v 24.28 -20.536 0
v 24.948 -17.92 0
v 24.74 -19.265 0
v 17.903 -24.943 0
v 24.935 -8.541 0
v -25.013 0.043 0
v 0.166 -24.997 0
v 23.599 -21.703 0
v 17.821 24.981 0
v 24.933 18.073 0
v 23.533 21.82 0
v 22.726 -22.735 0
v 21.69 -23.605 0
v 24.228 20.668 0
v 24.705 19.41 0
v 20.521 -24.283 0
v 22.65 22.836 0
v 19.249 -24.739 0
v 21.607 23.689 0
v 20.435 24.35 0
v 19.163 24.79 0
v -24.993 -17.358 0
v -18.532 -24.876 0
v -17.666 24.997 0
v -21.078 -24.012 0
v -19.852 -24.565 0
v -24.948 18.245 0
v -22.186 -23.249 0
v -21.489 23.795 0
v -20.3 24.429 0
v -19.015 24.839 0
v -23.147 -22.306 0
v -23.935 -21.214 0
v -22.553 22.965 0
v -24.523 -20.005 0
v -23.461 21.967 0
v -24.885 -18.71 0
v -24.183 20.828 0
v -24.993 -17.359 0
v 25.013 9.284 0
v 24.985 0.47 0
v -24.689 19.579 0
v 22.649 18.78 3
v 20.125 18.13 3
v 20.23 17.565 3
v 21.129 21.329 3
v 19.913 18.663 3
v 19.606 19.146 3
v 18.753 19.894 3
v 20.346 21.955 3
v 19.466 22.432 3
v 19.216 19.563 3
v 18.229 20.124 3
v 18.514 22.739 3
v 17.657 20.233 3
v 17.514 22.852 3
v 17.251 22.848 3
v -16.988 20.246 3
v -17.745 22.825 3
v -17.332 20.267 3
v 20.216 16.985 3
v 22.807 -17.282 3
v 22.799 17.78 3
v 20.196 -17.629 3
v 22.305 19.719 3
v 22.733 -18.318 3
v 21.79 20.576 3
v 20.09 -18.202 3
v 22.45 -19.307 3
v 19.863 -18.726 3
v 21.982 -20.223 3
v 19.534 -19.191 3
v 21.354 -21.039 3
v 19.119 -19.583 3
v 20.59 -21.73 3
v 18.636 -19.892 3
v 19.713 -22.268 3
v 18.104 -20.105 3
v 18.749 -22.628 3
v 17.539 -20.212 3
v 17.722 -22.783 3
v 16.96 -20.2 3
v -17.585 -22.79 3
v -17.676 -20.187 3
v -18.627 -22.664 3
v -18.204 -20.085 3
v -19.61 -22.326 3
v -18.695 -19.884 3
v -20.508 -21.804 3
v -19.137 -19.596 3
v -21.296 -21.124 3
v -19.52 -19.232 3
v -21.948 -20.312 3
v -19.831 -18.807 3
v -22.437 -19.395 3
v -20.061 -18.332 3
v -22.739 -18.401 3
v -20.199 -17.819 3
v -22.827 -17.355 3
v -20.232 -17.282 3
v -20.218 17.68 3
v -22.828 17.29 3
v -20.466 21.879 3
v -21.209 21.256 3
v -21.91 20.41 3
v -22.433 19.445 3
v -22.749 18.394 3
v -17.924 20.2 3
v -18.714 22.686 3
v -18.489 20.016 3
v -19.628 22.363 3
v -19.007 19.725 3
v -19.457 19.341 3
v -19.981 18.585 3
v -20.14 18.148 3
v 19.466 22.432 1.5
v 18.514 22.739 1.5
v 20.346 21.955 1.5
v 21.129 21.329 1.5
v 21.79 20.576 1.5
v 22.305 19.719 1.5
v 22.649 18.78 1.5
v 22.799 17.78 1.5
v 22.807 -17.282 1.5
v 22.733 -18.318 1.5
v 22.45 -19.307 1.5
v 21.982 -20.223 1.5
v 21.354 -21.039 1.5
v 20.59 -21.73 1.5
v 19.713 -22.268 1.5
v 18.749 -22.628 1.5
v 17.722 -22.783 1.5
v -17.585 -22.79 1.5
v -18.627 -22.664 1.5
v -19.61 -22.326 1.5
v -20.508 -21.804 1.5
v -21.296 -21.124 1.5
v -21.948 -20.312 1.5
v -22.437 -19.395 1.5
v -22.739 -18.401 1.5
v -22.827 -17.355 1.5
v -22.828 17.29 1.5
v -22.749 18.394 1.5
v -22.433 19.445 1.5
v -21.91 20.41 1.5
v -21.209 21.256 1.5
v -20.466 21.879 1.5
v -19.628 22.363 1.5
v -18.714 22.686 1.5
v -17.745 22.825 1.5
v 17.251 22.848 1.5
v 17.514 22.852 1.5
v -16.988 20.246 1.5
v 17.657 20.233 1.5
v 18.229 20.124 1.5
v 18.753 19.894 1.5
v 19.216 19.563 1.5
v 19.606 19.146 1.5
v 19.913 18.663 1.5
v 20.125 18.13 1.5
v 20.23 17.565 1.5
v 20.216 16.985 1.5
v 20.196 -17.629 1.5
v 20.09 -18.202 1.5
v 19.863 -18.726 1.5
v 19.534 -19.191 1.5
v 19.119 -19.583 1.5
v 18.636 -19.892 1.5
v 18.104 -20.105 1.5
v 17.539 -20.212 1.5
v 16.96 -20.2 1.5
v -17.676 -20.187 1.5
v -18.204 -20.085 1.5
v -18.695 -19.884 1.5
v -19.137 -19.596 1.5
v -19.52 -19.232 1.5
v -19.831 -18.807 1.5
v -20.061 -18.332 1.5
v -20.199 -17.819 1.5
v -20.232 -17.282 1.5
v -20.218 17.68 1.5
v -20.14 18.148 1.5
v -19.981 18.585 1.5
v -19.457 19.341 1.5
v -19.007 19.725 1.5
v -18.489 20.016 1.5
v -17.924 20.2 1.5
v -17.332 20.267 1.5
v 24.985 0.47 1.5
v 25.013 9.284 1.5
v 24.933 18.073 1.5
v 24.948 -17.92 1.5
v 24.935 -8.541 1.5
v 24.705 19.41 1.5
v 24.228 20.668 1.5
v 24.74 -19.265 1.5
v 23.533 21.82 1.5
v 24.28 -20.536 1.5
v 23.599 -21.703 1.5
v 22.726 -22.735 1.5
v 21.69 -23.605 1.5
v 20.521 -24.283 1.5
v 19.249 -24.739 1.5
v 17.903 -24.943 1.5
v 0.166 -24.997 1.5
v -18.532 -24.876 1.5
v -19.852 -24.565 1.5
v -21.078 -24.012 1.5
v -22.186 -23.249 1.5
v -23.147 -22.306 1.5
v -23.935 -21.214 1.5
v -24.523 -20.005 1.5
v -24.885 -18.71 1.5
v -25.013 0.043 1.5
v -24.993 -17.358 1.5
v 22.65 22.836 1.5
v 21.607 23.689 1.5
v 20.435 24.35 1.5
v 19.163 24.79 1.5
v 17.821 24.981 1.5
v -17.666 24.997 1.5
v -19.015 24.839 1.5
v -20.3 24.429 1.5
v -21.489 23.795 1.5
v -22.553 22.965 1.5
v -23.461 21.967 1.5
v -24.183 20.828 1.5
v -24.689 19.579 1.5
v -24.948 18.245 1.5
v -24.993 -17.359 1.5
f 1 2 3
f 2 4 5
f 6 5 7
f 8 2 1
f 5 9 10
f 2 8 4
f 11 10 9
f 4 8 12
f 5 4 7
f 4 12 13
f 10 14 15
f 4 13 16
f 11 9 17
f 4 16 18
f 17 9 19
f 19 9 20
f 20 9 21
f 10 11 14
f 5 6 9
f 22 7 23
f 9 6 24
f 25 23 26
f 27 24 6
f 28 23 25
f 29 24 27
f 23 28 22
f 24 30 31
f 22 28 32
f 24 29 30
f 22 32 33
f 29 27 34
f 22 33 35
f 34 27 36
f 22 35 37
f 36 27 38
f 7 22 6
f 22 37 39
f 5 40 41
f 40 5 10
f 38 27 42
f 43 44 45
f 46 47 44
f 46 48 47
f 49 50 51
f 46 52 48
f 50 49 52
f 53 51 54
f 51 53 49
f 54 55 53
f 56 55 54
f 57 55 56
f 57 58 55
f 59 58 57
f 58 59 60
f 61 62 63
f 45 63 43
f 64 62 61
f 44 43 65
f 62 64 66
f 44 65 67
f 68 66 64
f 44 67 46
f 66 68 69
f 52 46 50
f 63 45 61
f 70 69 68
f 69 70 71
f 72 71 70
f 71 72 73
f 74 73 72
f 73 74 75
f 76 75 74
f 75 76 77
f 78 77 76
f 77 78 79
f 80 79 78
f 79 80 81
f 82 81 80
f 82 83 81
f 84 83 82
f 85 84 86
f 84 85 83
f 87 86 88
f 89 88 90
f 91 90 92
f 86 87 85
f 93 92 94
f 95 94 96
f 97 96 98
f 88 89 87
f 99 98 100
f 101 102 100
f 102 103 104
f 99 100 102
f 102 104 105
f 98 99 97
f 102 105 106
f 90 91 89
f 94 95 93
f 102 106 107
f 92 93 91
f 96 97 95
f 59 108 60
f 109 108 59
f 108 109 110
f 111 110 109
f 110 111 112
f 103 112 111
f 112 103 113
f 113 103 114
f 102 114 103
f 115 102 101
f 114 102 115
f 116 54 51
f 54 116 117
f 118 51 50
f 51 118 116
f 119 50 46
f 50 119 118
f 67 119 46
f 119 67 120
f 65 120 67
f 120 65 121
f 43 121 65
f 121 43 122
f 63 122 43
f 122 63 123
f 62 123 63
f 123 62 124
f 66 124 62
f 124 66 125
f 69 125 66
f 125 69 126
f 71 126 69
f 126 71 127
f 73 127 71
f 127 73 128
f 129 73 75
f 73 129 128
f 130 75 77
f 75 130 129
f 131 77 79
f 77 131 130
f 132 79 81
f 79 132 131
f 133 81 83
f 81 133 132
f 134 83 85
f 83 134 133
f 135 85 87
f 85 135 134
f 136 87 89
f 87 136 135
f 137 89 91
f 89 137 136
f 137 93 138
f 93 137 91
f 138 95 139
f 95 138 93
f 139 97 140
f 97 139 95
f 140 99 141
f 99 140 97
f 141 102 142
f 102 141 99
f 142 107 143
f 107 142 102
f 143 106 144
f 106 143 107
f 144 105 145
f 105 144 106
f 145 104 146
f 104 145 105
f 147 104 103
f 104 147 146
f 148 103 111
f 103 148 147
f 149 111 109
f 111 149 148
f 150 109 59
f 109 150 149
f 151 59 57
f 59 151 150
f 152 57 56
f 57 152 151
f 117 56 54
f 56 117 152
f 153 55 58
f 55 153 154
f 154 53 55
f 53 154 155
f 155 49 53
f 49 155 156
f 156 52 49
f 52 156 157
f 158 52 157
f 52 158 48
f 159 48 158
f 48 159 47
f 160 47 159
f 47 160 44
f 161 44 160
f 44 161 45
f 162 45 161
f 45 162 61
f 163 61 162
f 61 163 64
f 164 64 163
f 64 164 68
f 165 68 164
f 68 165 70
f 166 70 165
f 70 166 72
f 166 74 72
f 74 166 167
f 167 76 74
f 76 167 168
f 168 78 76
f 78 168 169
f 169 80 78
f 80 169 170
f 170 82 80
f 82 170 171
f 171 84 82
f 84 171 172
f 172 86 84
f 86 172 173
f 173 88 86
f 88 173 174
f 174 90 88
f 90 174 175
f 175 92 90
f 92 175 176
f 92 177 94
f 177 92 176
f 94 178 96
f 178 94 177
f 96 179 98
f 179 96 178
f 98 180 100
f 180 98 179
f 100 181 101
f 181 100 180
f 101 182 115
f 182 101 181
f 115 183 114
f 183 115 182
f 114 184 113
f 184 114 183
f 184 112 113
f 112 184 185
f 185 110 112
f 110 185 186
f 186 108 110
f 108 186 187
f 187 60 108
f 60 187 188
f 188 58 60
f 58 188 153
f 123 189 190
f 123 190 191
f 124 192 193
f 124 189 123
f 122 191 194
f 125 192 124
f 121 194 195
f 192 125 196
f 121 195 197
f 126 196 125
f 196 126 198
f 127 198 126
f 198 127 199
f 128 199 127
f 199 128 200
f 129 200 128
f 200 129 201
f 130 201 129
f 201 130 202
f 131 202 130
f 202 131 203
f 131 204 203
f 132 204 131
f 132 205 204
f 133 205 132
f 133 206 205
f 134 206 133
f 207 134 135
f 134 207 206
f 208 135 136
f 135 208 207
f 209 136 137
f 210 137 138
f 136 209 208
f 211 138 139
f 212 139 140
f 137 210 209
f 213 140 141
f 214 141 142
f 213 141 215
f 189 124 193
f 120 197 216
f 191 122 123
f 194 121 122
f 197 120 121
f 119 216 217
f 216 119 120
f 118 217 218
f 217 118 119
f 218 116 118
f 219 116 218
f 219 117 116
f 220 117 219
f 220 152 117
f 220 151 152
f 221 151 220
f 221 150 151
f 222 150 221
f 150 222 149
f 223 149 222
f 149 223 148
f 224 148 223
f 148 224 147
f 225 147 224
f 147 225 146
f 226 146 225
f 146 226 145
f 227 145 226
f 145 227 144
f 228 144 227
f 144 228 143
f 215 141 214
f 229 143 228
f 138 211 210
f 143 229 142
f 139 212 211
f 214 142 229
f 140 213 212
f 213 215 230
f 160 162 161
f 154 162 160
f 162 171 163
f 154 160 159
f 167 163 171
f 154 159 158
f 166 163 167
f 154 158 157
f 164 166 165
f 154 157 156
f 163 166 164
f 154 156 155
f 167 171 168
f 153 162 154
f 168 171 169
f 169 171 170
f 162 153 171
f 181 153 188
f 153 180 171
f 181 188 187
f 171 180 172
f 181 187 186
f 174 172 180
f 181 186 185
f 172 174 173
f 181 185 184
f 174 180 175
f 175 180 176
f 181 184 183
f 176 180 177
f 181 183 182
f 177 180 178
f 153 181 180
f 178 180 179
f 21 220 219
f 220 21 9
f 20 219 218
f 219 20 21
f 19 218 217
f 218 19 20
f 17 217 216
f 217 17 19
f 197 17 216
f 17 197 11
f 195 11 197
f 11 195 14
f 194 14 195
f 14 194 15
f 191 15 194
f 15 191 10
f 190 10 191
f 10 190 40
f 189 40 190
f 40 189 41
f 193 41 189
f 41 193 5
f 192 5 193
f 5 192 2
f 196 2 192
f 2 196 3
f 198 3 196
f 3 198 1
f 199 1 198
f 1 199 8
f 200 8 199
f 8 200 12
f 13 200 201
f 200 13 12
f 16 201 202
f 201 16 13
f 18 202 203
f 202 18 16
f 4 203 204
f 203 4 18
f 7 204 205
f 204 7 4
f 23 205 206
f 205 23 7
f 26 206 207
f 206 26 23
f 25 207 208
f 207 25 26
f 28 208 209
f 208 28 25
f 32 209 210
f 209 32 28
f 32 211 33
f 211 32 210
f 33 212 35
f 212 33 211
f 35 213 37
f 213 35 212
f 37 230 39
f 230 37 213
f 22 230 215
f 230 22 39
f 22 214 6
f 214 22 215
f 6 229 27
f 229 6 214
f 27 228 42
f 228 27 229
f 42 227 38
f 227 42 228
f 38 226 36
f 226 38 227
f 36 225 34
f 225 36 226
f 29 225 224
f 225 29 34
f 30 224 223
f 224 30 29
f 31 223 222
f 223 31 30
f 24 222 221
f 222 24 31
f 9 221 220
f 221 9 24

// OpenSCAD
// Module names are of the form poly_<inkscape-path-id>().  As a result,
// you can associate a polygon in this OpenSCAD program with the corresponding
// SVG element in the Inkscape document by looking for the XML element with
// the attribute id="inkscape-path-id".

// fudge value is used to ensure that subtracted solids are a tad taller
// in the z dimension than the polygon being subtracted from.  This helps
// keep the resulting .stl file manifold.
fudge = 0.1;

module poly_fg_arrow_3_mm(h)
{
  scale([25.4/90, -25.4/90, 1]) union()
  {
    linear_extrude(height=h)
      polygon([[-61.404416,-39.652171],[39.533524,61.285759],[51.468314,49.350979],[12.580374,10.463049],[12.580384,-28.359101],[21.018934,-28.359101],[4.141224,-57.557941],[-12.737086,-28.358501],[-4.297936,-28.359001],[-4.297936,-6.415161],[-49.469626,-51.586861],[-61.404416,-39.652071]]);
  }
}

module poly_fg_border_3_mm(h)
{
  scale([25.4/90, -25.4/90, 1]) union()
  {
    difference()
    {
       linear_extrude(height=h)
         polygon([[62.056224,-80.972851],[61.124584,-80.957251],[-62.876386,-80.875251],[-66.309854,-80.382852],[-69.547473,-79.240134],[-72.517909,-77.525570],[-75.149826,-75.317631],[-77.633388,-72.318023],[-79.486783,-68.899794],[-80.606270,-65.177056],[-80.888106,-61.263921],[-80.884106,61.492919],[-80.570959,65.199698],[-79.501488,68.724101],[-77.766889,71.971683],[-75.458362,74.847999],[-72.667103,77.258605],[-69.484311,79.109055],[-66.001182,80.304905],[-62.308916,80.751709],[62.794604,80.725409],[66.434983,80.176821],[69.850544,78.902171],[72.955368,76.994803],[75.663533,74.548059],[77.889120,71.655283],[79.546207,68.409818],[80.548876,64.905006],[80.811204,61.234189],[80.782904,-62.998231],[80.253846,-66.541647],[79.033477,-69.870898],[77.208629,-72.907840],[74.866134,-75.574329],[72.092824,-77.792220],[68.975531,-79.483369],[65.601087,-80.569630],[62.056324,-80.972861]]);
       translate([0, 0, -fudge])
         linear_extrude(height=h+2*fudge)
           polygon([[-61.411546,-71.810741],[-60.194746,-71.738441],[62.564034,-71.691541],[64.592436,-71.303969],[66.446988,-70.491692],[68.086762,-69.316933],[69.470827,-67.841914],[70.558255,-66.128861],[71.308116,-64.239995],[71.679483,-62.237540],[71.631424,-60.183721],[71.562124,62.465689],[71.184779,64.495563],[70.381060,66.353497],[69.213281,67.998131],[67.743751,69.388101],[66.034782,70.482044],[64.148685,71.238598],[62.147772,71.616401],[60.094354,71.574089],[-62.630256,71.527189],[-64.502337,71.167796],[-66.241422,70.455089],[-67.808312,69.433264],[-69.163808,68.146516],[-70.268712,66.639041],[-71.083824,64.955036],[-71.569944,63.138697],[-71.687876,61.234219],[-71.639076,-62.644691],[-71.362847,-64.302925],[-70.799432,-65.851302],[-68.943756,-68.532381],[-67.347031,-69.892006],[-65.512967,-70.921612],[-63.511242,-71.576182],[-61.411536,-71.810701]]);
    }
  }
}

module poly_bg_1_5_mm(h)
{
  scale([25.4/90, -25.4/90, 1]) union()
  {
    linear_extrude(height=h)
      polygon([[-88.558896,61.506519],[-88.175721,66.294050],[-86.894156,70.884754],[-84.809336,75.168780],[-82.016397,79.036277],[-78.610474,82.377395],[-74.686702,85.082284],[-70.340218,87.041092],[-65.666156,88.143969],[0.586542,88.571411],[63.437464,88.381789],[68.206165,87.657107],[72.713544,86.042240],[76.854760,83.641417],[80.524973,80.558862],[83.619341,76.898802],[86.033023,72.765465],[87.661178,68.263075],[88.398964,63.495859],[88.351349,30.262087],[88.528233,-1.666347],[88.627183,-32.897118],[88.345764,-64.037901],[87.535682,-68.774486],[85.847132,-73.233627],[83.385052,-77.314470],[80.254379,-80.916161],[76.560051,-83.937844],[72.407006,-86.278667],[67.900181,-87.837774],[63.144514,-88.514311],[-62.596206,-88.571411],[-67.376574,-88.012732],[-71.927578,-86.560080],[-76.141757,-84.313043],[-79.911653,-81.371208],[-83.129807,-77.834165],[-85.688760,-73.801502],[-87.481053,-69.372808],[-88.399226,-64.647671],[-88.627183,-0.153697],[-88.558846,61.506499]]);
  }
}

module inkscape(h)
{

poly_fg_arrow_3_mm(3);
poly_fg_border_3_mm(3);
poly_bg_1_5_mm(1.5);
}

inkscape(5);
